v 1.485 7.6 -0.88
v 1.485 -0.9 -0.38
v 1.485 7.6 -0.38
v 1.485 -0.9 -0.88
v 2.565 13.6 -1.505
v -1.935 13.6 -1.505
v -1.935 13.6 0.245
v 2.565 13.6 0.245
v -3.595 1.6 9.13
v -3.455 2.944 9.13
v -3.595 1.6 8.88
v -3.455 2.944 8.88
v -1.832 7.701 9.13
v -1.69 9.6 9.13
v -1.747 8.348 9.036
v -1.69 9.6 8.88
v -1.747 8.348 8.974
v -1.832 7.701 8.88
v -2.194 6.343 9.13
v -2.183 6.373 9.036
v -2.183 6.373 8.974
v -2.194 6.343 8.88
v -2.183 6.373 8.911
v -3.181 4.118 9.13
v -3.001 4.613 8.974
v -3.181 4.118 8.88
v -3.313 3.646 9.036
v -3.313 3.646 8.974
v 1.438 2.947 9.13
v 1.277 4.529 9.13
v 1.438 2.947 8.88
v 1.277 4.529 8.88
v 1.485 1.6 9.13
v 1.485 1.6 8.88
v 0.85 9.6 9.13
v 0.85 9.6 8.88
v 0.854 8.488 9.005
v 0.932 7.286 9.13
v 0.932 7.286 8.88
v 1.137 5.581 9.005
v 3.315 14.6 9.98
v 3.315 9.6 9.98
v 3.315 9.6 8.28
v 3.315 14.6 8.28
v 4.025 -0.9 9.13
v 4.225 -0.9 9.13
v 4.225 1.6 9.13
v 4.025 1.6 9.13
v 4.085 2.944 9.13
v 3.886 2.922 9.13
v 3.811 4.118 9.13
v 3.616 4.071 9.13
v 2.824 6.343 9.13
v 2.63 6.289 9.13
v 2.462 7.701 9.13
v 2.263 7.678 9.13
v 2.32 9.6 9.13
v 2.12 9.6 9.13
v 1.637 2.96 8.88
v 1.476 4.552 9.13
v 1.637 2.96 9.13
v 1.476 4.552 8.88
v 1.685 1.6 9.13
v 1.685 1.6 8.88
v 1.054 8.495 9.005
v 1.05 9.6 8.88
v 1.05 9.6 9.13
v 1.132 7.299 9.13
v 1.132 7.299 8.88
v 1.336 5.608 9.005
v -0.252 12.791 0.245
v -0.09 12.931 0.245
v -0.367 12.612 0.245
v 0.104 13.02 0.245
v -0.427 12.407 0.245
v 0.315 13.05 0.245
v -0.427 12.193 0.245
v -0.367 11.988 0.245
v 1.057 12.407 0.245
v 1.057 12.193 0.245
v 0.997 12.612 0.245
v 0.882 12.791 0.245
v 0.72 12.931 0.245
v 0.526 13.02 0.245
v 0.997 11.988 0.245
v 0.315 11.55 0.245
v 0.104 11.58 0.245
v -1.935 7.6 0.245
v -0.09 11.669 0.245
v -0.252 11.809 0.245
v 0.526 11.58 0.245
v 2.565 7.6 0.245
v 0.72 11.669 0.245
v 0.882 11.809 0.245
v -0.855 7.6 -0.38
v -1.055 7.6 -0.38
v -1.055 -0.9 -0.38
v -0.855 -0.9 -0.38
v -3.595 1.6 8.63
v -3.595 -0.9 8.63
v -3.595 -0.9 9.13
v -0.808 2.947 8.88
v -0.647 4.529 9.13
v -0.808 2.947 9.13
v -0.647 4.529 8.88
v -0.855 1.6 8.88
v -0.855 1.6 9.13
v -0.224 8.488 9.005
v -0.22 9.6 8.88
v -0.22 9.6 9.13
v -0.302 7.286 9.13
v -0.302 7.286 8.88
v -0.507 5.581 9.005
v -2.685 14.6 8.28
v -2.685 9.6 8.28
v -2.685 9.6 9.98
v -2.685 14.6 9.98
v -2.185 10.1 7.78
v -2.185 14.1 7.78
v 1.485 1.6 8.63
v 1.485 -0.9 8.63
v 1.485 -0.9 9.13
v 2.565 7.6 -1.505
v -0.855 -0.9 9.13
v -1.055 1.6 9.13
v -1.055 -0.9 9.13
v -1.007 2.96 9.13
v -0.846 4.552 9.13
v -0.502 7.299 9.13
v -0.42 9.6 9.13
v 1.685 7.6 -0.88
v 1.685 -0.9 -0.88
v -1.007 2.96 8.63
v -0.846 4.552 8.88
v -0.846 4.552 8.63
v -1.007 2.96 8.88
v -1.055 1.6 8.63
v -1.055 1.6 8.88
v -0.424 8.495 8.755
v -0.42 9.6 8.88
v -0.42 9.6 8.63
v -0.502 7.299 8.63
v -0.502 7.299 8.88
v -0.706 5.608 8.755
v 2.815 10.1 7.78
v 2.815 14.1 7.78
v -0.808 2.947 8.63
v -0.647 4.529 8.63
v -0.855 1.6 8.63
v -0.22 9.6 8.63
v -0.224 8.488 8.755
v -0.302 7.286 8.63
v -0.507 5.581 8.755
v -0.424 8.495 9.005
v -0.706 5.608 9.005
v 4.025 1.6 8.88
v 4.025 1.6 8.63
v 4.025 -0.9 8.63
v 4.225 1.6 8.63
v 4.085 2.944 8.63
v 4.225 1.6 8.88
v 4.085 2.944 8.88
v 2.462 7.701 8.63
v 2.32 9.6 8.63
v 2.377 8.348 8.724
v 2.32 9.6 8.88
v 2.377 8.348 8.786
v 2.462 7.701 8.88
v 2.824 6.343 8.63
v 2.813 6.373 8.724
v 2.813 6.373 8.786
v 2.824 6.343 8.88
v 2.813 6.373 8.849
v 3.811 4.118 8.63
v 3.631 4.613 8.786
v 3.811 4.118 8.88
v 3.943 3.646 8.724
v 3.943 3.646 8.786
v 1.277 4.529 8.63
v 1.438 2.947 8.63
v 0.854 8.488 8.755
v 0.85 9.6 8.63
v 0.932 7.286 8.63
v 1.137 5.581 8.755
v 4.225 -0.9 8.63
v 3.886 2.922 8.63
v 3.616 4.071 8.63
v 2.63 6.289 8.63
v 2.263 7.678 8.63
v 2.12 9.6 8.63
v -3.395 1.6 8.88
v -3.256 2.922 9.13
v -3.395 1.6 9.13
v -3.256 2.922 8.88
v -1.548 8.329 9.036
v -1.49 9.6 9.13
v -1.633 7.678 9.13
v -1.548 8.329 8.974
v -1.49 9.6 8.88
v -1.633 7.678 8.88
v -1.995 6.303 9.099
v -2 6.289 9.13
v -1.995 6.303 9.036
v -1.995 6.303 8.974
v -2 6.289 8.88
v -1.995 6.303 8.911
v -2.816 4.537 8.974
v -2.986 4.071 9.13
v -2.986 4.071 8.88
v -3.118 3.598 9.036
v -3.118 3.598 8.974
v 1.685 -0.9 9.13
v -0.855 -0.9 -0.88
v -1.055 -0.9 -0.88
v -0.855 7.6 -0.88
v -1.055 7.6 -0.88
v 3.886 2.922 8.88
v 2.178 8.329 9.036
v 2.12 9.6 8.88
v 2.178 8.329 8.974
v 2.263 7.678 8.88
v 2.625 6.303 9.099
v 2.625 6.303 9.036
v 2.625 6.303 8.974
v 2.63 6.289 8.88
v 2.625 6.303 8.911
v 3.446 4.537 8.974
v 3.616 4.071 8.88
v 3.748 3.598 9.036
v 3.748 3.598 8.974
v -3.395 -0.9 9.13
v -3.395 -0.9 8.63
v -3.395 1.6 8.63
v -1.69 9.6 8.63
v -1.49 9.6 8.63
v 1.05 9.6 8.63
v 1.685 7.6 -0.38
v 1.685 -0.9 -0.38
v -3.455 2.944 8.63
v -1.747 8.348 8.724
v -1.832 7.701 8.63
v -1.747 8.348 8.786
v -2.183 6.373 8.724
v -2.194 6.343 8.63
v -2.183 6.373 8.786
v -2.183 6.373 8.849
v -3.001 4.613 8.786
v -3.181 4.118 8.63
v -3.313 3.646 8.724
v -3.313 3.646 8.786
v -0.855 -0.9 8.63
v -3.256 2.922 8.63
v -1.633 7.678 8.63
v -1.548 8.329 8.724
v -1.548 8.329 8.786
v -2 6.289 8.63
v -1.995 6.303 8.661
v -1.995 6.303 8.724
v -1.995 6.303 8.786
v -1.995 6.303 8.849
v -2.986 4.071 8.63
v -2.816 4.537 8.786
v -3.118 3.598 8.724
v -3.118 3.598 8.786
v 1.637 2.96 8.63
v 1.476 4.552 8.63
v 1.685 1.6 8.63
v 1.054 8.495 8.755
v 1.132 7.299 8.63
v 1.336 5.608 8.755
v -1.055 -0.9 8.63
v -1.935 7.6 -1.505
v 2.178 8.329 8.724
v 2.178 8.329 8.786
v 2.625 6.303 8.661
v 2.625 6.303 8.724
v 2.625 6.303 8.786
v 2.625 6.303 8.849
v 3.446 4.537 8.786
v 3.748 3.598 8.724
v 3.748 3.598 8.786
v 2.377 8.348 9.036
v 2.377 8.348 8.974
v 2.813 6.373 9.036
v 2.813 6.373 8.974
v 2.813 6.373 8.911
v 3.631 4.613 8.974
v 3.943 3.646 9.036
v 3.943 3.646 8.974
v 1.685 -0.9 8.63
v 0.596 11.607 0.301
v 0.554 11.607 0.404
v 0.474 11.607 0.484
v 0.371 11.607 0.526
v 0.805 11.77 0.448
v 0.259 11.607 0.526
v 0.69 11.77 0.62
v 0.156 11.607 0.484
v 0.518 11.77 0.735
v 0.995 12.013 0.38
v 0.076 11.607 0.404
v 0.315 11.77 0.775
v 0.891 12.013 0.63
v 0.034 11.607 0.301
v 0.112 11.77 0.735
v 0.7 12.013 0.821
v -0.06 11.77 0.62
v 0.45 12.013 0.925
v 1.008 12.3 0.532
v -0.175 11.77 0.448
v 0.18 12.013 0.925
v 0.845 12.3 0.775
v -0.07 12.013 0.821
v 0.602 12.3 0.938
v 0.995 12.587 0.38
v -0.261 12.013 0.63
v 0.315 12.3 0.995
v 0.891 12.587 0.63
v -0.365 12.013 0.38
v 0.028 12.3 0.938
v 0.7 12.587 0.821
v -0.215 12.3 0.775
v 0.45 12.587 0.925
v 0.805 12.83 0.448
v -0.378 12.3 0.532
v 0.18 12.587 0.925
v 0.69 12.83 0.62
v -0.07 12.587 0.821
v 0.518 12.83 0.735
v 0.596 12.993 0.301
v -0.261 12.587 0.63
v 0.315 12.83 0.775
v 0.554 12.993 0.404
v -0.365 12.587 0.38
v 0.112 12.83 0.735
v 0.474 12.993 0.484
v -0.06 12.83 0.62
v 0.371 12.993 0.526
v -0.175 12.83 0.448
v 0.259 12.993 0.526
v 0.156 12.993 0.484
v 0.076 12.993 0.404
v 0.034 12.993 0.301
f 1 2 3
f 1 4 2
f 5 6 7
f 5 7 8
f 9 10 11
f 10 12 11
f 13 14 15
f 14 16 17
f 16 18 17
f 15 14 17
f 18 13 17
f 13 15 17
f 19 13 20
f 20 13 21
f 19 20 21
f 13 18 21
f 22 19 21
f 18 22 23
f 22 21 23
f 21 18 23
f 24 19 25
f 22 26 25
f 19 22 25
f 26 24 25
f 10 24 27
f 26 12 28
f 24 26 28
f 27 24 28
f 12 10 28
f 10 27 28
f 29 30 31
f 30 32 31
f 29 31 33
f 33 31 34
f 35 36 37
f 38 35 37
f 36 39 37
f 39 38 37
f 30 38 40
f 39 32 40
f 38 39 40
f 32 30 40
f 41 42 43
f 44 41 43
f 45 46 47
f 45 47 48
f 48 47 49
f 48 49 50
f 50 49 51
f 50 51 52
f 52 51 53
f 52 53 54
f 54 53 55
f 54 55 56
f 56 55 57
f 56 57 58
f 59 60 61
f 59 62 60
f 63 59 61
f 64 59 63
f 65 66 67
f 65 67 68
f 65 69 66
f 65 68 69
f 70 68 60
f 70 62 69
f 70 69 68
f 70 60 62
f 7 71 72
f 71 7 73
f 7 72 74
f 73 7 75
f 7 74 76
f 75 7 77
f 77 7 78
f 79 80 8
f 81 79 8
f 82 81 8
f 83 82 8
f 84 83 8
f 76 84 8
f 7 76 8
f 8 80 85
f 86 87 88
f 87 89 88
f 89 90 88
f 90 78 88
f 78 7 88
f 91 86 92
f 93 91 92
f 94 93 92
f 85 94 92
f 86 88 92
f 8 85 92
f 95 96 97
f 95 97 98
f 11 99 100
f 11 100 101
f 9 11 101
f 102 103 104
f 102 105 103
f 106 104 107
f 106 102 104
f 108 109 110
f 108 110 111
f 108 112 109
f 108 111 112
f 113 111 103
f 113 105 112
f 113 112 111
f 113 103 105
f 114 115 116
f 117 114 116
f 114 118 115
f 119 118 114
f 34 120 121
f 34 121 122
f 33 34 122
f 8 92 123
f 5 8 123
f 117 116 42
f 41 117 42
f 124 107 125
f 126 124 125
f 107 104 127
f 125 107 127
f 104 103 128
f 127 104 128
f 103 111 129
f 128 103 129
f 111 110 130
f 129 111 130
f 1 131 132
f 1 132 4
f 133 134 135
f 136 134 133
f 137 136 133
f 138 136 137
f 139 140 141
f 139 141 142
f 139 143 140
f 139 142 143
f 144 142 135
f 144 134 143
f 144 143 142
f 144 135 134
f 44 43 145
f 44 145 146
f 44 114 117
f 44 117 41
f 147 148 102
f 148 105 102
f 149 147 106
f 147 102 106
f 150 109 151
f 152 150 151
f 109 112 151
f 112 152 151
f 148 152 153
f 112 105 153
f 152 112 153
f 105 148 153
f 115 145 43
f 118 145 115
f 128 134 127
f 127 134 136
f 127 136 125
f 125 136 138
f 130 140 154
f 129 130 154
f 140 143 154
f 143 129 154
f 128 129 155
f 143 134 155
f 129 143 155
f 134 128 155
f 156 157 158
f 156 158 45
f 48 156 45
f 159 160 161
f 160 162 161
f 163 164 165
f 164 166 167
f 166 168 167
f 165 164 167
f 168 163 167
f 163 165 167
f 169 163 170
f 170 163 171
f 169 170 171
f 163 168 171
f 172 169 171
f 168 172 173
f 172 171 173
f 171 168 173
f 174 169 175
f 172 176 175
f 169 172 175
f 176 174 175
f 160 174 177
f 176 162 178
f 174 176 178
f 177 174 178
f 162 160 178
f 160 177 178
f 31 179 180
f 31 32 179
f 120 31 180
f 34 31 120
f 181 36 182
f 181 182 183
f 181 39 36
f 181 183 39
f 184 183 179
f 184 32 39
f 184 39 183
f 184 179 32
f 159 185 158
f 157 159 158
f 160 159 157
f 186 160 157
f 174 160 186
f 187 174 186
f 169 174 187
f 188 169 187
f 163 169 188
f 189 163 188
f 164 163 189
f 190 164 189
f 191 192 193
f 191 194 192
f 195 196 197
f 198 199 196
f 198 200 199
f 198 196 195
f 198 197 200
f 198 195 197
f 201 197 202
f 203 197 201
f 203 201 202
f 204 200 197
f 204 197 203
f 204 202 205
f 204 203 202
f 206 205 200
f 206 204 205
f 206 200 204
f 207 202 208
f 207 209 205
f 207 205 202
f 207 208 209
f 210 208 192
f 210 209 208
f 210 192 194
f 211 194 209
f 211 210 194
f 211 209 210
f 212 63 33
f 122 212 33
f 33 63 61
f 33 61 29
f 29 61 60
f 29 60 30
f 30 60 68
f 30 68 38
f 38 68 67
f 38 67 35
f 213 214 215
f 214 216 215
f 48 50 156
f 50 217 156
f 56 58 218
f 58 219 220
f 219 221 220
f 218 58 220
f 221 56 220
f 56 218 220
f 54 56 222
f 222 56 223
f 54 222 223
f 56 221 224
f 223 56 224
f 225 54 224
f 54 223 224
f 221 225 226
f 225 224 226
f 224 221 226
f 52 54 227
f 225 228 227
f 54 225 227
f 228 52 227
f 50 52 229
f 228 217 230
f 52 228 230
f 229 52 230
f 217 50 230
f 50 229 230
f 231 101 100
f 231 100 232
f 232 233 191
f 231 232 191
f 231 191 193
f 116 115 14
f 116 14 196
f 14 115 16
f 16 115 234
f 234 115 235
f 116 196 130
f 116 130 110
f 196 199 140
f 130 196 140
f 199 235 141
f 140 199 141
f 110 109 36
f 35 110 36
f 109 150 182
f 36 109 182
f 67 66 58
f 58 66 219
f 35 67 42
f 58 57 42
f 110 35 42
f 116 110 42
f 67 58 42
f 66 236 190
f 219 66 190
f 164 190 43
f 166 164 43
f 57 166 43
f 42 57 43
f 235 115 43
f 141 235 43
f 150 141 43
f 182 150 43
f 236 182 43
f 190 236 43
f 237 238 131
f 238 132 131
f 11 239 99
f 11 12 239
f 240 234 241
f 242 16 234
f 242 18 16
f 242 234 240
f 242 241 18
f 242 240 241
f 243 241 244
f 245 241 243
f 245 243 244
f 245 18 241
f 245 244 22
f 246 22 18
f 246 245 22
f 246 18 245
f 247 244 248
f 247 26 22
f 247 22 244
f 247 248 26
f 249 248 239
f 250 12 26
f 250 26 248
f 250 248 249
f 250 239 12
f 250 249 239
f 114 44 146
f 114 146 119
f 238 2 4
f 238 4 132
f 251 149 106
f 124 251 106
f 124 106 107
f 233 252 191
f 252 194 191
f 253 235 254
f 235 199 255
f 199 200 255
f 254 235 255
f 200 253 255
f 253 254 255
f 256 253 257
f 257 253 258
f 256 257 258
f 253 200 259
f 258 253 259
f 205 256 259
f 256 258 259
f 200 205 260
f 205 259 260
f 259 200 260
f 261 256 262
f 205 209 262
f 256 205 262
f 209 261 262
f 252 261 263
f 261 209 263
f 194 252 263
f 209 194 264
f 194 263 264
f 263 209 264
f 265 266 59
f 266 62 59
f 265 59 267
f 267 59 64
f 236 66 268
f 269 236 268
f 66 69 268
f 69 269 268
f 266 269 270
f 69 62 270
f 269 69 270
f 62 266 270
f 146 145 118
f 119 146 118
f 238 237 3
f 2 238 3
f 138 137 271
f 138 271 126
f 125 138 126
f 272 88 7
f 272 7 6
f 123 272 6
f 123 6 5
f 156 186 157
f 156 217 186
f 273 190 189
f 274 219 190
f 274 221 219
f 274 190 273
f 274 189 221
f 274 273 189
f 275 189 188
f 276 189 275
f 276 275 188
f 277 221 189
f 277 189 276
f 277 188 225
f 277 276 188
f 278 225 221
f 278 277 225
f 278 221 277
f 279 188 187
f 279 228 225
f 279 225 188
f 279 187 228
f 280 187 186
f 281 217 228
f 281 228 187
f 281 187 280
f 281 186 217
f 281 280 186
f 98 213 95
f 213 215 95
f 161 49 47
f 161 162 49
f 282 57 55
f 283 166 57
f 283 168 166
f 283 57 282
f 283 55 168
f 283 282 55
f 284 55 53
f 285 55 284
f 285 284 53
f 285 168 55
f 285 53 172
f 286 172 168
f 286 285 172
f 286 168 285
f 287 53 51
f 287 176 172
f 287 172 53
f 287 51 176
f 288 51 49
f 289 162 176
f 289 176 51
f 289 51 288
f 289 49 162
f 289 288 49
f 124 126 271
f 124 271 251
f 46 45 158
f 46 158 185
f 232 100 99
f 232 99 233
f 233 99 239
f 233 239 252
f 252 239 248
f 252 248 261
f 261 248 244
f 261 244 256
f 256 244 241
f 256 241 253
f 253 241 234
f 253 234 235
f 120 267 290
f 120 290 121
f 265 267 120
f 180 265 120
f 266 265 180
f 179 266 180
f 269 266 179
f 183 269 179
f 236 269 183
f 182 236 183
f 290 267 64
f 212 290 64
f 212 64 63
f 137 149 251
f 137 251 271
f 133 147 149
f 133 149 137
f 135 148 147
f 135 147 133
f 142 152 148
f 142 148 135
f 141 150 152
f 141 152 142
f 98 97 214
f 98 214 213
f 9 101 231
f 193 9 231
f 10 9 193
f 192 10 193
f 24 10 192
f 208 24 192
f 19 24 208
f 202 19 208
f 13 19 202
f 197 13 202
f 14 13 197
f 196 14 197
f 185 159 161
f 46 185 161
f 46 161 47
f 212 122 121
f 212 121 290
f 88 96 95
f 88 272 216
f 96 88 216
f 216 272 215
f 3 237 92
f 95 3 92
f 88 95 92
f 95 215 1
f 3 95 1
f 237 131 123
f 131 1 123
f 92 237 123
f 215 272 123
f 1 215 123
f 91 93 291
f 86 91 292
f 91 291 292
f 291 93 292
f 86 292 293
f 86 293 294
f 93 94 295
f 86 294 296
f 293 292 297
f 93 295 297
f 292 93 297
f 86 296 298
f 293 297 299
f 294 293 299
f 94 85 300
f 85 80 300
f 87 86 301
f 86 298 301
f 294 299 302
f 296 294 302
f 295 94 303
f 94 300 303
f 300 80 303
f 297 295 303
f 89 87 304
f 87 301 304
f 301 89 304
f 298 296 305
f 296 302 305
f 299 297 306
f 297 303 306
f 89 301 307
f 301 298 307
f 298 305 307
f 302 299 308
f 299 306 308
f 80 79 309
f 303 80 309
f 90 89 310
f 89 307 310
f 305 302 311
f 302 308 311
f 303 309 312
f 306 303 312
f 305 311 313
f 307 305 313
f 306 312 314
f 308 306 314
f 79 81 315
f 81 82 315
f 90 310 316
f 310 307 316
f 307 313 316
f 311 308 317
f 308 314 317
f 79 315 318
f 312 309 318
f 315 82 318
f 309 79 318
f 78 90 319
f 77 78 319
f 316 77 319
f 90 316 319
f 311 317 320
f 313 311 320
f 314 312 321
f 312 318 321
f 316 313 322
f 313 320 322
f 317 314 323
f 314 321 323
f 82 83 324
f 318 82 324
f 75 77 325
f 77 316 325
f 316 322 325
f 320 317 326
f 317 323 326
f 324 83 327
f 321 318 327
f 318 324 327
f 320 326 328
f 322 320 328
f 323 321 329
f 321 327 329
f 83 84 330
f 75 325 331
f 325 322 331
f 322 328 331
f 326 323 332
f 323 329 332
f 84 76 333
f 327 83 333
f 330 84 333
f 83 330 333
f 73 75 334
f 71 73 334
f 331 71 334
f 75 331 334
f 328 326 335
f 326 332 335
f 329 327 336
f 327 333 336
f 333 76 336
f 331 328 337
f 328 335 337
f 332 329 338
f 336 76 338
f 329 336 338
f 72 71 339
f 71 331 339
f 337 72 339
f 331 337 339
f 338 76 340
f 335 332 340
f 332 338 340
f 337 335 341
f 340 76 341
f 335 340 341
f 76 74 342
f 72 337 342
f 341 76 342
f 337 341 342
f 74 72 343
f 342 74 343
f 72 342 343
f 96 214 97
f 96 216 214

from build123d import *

# Parameters (mm, degrees)
SKETCH1_W                = 3.18
SKETCH1_H                = 8.32
SKETCH1_W_2              = 8.26
SKETCH1_H_2              = 3.18
SKETCH1_H_3              = 8.26
SKETCH1_H_4              = 5.72
SKETCH1_W_3              = 3.94
SKETCH1_H_5              = 12.7
BOSS_EXTRUDE2_DEPTH      = 1.6
BOSS_EXTRUDE3_START      = 8
BOSS_EXTRUDE3_DEPTH      = 5
BOSS_EXTRUDE4_START      = -1.1
BOSS_EXTRUDE4_DEPTH      = 0.25
BOSS_EXTRUDE4_DEPTH_BACK = 0.25
CHAMFER1_SIZE            = 0.5
BOSS_EXTRUDE5_START      = 6
SKETCH5_W                = 4.5
SKETCH5_H                = 1.75
BOSS_EXTRUDE5_DEPTH      = 6
BOSS_EXTRUDE6_START      = -0.875
SKETCH7_W                = 0.2
SKETCH7_H                = 6
BOSS_EXTRUDE6_DEPTH      = 0.25
BOSS_EXTRUDE6_DEPTH_BACK = 0.25
SKETCH8_R                = 0.635
CUT_EXTRUDE1_DEPTH       = 2.6
SKETCH9_W                = 71.682790583
SKETCH9_H                = 73.419144216
CUT_EXTRUDE2_DEPTH       = 1.6
SKETCH10_W               = 0.200265949
SKETCH10_H               = 0.5
SKETCH10_W_2             = 0.200003992
SKETCH10_W_3             = 0.2
BOSS_EXTRUDE7_DEPTH      = 2.5


with BuildPart() as part:
    # Sketch1 → Boss-Extrude2 (new body)
    with BuildSketch(Plane(origin=(0, 0, 0), x_dir=(1, 0, 0), z_dir=(0, 1, 0))):
        Polygon((-23.815, 0), (-23.815, 29.84), (24.115, 29.84), (24.115, 0), (24.115, -29.84), (-23.815, -29.84), align=None)
        with Locations((-20.955, 15.53)):
            Rectangle(SKETCH1_W, SKETCH1_H, mode=Mode.SUBTRACT)
        with Locations((-4.445, 7.93)):
            Rectangle(SKETCH1_W_2, SKETCH1_H_2, mode=Mode.SUBTRACT)
        with Locations((-20.955, -0.94)):
            Rectangle(SKETCH1_W, SKETCH1_H_3, mode=Mode.SUBTRACT)
        with Locations((21.005, 25.71)):
            Rectangle(SKETCH1_W, SKETCH1_H_4, mode=Mode.SUBTRACT)
        with Locations((20.305, -15.55)):
            Rectangle(SKETCH1_W, SKETCH1_H_3, mode=Mode.SUBTRACT)
        with Locations((14.845, -9.58)):
            Rectangle(SKETCH1_W_3, SKETCH1_H_5, mode=Mode.SUBTRACT)
    extrude(amount=BOSS_EXTRUDE2_DEPTH)



with BuildPart() as body_2:
    # Sketch3 → Boss-Extrude3 (new body)
    with BuildSketch(Plane(origin=(0, 1.6, 0), x_dir=(1, 0, 0), z_dir=(0, 1, 0)).offset(BOSS_EXTRUDE3_START)):
        Polygon((0.315, -7.78), (-2.685, -7.78), (-2.685, -9.98), (0.315, -9.98), (3.315, -9.98), (3.315, -7.78), align=None)
    extrude(amount=BOSS_EXTRUDE3_DEPTH)


with BuildPart() as part_1:
    add(part.part)

    add(body_2.part)  # Boss-Extrude4 merges body 2
    # Sketch4 → Boss-Extrude4 (add, two sides)
    with BuildSketch(Plane.XY.offset(9.98).offset(BOSS_EXTRUDE4_START)) as boss_extrude4_sk:
        with BuildLine():
            Line((-1.690000547, 9.6), (-1.489999461, 9.6))
            add(Edge.make_bspline(
                [(-1.489999461, 9.6), (-1.490724676, 9.378615191), (-1.501150351, 8.921966702), (-1.557643402, 8.121923712), (-1.697410233, 7.229711912), (-1.97391224, 6.293277185), (-2.377283852, 5.415108244), (-2.844851076, 4.550624944), (-3.233739916, 3.293659471), (-3.359982321, 2.27142251), (-3.394866088, 1.6)],
                knots=[-2.4969e-05, -2.4969e-05, -2.4969e-05, -2.4969e-05, 0.05029142, 0.100582839, 0.201165679, 0.301748518, 0.402331357, 0.502914197, 0.603497036, 0.80414952, 0.80414952, 0.80414952, 0.80414952], degree=3))
            Line((-3.394866088, 1.6), (-3.595132037, 1.6))
            add(Edge.make_bspline(
                [(-1.690000547, 9.6), (-1.69072463, 9.38164845), (-1.701031258, 8.930534953), (-1.756658157, 8.144235526), (-1.893064323, 7.273307969), (-2.162944464, 6.361554733), (-2.550643297, 5.515600408), (-3.030540836, 4.627219412), (-3.432934775, 3.326482293), (-3.559913653, 2.287505886), (-3.595132037, 1.6)],
                knots=[2.5291e-05, 2.5291e-05, 2.5291e-05, 2.5291e-05, 0.05029142, 0.100582839, 0.201165679, 0.301748518, 0.402331357, 0.502914197, 0.603497036, 0.805166415, 0.805166415, 0.805166415, 0.805166415], degree=3))
        make_face()
        with BuildLine():
            Line((-0.420030875, 9.6), (-0.219969453, 9.6))
            add(Edge.make_bspline(
                [(-0.219969453, 9.6), (-0.215286197, 9.410037733), (-0.211453119, 9.021656245), (-0.225743152, 8.30492942), (-0.299753538, 7.127767003), (-0.503670741, 5.597842901), (-0.770994323, 3.658720552), (-0.859324782, 2.280063776), (-0.85499799, 1.6)],
                knots=[0.000218879, 0.000218879, 0.000218879, 0.000218879, 0.050557538, 0.101115077, 0.202230153, 0.404460306, 0.606690459, 0.808983257, 0.808983257, 0.808983257, 0.808983257], degree=3))
            Line((-0.85499799, 1.6), (-1.055001982, 1.6))
            add(Edge.make_bspline(
                [(-0.420030875, 9.6), (-0.415306869, 9.410414309), (-0.411448243, 9.024159618), (-0.425621065, 8.313593273), (-0.498810074, 7.148902433), (-0.701395153, 5.627430708), (-0.96986031, 3.682389129), (-1.05931075, 2.286737109), (-1.055001982, 1.6)],
                knots=[-0.000221191, -0.000221191, -0.000221191, -0.000221191, 0.050557538, 0.101115077, 0.202230153, 0.404460306, 0.606690459, 0.808858614, 0.808858614, 0.808858614, 0.808858614], degree=3))
        make_face()
        with BuildLine():
            Line((0.849969454, 9.6), (1.050030874, 9.6))
            add(Edge.make_bspline(
                [(1.050030874, 9.6), (1.045306869, 9.410414309), (1.041448243, 9.024159618), (1.055621064, 8.313593273), (1.128810074, 7.148902433), (1.331395152, 5.627430708), (1.599860309, 3.682389129), (1.689310749, 2.286737109), (1.685001982, 1.6)],
                knots=[-0.000221191, -0.000221191, -0.000221191, -0.000221191, 0.050557538, 0.101115077, 0.202230153, 0.404460306, 0.606690459, 0.808858614, 0.808858614, 0.808858614, 0.808858614], degree=3))
            Line((1.685001982, 1.6), (1.48499799, 1.6))
            add(Edge.make_bspline(
                [(0.849969454, 9.6), (0.845286198, 9.410037733), (0.841453119, 9.021656245), (0.855743152, 8.30492942), (0.929753538, 7.127767003), (1.133670741, 5.597842901), (1.400994323, 3.658720552), (1.489324782, 2.280063776), (1.48499799, 1.6)],
                knots=[0.000218879, 0.000218879, 0.000218879, 0.000218879, 0.050557538, 0.101115077, 0.202230153, 0.404460306, 0.606690459, 0.808983257, 0.808983257, 0.808983257, 0.808983257], degree=3))
        make_face()
        with BuildLine():
            Line((2.11999946, 9.6), (2.320000547, 9.6))
            add(Edge.make_bspline(
                [(2.320000547, 9.6), (2.320724629, 9.38164845), (2.331031257, 8.930534953), (2.386658156, 8.144235526), (2.523064322, 7.273307969), (2.792944463, 6.361554733), (3.180643297, 5.515600408), (3.660540836, 4.627219412), (4.062934774, 3.326482293), (4.189913652, 2.287505886), (4.225132036, 1.6)],
                knots=[2.5291e-05, 2.5291e-05, 2.5291e-05, 2.5291e-05, 0.05029142, 0.100582839, 0.201165679, 0.301748518, 0.402331357, 0.502914197, 0.603497036, 0.805166415, 0.805166415, 0.805166415, 0.805166415], degree=3))
            Line((4.225132036, 1.6), (4.024866087, 1.6))
            add(Edge.make_bspline(
                [(2.11999946, 9.6), (2.120724676, 9.378615191), (2.13115035, 8.921966702), (2.187643402, 8.121923712), (2.327410232, 7.229711912), (2.60391224, 6.293277185), (3.007283851, 5.415108244), (3.474851076, 4.550624944), (3.863739916, 3.293659471), (3.98998232, 2.27142251), (4.024866087, 1.6)],
                knots=[-2.4969e-05, -2.4969e-05, -2.4969e-05, -2.4969e-05, 0.05029142, 0.100582839, 0.201165679, 0.301748518, 0.402331357, 0.502914197, 0.603497036, 0.80414952, 0.80414952, 0.80414952, 0.80414952], degree=3))
        make_face()
    extrude(amount=BOSS_EXTRUDE4_DEPTH)
    extrude(boss_extrude4_sk.sketch, amount=-BOSS_EXTRUDE4_DEPTH_BACK)

    # Chamfer1
    chamfer1_edges = [part_1.edges().sort_by_distance(p)[0] for p in [
        (0.315, 9.6, 7.78),
        (3.315, 12.1, 7.78),
        (-2.685, 12.1, 7.78),
        (0.315, 14.6, 7.78),
    ]]
    chamfer(chamfer1_edges, length=CHAMFER1_SIZE)



with BuildPart() as body_2_2:
    # Sketch5 → Boss-Extrude5 (new body)
    with BuildSketch(Plane(origin=(0, 1.6, 0), x_dir=(1, 0, 0), z_dir=(0, 1, 0)).offset(BOSS_EXTRUDE5_START)):
        with Locations((0.315, 0.63)):
            Rectangle(SKETCH5_W, SKETCH5_H)
    extrude(amount=BOSS_EXTRUDE5_DEPTH)

    # Sketch6 → Revolve1 (revolve)
    with BuildSketch(Plane.XY.offset(0.245)):
        with BuildLine():
            Line((0.315, 13.05), (0.315, 12.3))
            Line((0.315, 12.3), (0.315, 11.55))
            ThreePointArc((0.315, 11.55), (1.065, 12.3), (0.315, 13.05))
        make_face()
    revolve(axis=Axis((0.315, 13.05, 0.245), (0, -1, 0)))


with BuildPart() as part_2:
    add(part_1.part)

    add(body_2_2.part)  # Boss-Extrude6 merges body 2 2
    # Sketch7 → Boss-Extrude6 (add, two sides)
    with BuildSketch(Plane(origin=(0, 0, -1.505), x_dir=(-1, 0, 0), z_dir=(0, 0, -1)).offset(BOSS_EXTRUDE6_START)) as boss_extrude6_sk:
        with Locations((-1.585, 4.6)):
            Rectangle(SKETCH7_W, SKETCH7_H)
        with Locations((0.955, 4.6)):
            Rectangle(SKETCH7_W, SKETCH7_H)
    extrude(amount=BOSS_EXTRUDE6_DEPTH)
    extrude(boss_extrude6_sk.sketch, amount=-BOSS_EXTRUDE6_DEPTH_BACK)

    # Sketch8 → Cut-Extrude1 (cut, through all)
    with BuildSketch(Plane(origin=(0, 1.6, 0), x_dir=(1, 0, 0), z_dir=(0, 1, 0))):
        with Locations((-0.955, 4.44)):
            Circle(SKETCH8_R)
        with Locations((1.585, 4.44)):
            Circle(SKETCH8_R)
        with Locations((4.125, 4.44)):
            Circle(SKETCH8_R)
        with Locations((-3.495, 4.44)):
            Circle(SKETCH8_R)
        with Locations((-7.815, 4.016666667)):
            Circle(SKETCH8_R)
        with Locations((-14.365, 4.016666667)):
            Circle(SKETCH8_R)
        with Locations((-14.365, -0.503333333)):
            Circle(SKETCH8_R)
        with Locations((-7.815, -0.503333333)):
            Circle(SKETCH8_R)
        with Locations((14.995, -0.503333333)):
            Circle(SKETCH8_R)
        with Locations((8.445, -0.503333333)):
            Circle(SKETCH8_R)
        with Locations((14.995, 4.016666667)):
            Circle(SKETCH8_R)
        with Locations((8.445, 4.016666667)):
            Circle(SKETCH8_R)
    extrude(amount=-CUT_EXTRUDE1_DEPTH, mode=Mode.SUBTRACT)

    # Sketch9 → Cut-Extrude2 (cut)
    with BuildSketch(Plane.XZ):
        with Locations((0.802366539, 0.541931826)):
            Rectangle(SKETCH9_W, SKETCH9_H)
    extrude(amount=-CUT_EXTRUDE2_DEPTH, mode=Mode.SUBTRACT)

    # Sketch10 → Boss-Extrude7 (add)
    with BuildSketch(Plane.XZ.offset(-1.6)):
        with Locations((-3.494999063, 8.88)):
            Rectangle(SKETCH10_W, SKETCH10_H)
        with Locations((-0.954999986, 8.88)):
            Rectangle(SKETCH10_W_2, SKETCH10_H)
        with Locations((1.584999986, 8.88)):
            Rectangle(SKETCH10_W_2, SKETCH10_H)
        with Locations((4.124999062, 8.88)):
            Rectangle(SKETCH10_W, SKETCH10_H)
        with Locations((-0.955, -0.63)):
            Rectangle(SKETCH10_W_3, SKETCH10_H)
        with Locations((1.585, -0.63)):
            Rectangle(SKETCH10_W_3, SKETCH10_H)
    extrude(amount=BOSS_EXTRUDE7_DEPTH)


solid = part_2.part
